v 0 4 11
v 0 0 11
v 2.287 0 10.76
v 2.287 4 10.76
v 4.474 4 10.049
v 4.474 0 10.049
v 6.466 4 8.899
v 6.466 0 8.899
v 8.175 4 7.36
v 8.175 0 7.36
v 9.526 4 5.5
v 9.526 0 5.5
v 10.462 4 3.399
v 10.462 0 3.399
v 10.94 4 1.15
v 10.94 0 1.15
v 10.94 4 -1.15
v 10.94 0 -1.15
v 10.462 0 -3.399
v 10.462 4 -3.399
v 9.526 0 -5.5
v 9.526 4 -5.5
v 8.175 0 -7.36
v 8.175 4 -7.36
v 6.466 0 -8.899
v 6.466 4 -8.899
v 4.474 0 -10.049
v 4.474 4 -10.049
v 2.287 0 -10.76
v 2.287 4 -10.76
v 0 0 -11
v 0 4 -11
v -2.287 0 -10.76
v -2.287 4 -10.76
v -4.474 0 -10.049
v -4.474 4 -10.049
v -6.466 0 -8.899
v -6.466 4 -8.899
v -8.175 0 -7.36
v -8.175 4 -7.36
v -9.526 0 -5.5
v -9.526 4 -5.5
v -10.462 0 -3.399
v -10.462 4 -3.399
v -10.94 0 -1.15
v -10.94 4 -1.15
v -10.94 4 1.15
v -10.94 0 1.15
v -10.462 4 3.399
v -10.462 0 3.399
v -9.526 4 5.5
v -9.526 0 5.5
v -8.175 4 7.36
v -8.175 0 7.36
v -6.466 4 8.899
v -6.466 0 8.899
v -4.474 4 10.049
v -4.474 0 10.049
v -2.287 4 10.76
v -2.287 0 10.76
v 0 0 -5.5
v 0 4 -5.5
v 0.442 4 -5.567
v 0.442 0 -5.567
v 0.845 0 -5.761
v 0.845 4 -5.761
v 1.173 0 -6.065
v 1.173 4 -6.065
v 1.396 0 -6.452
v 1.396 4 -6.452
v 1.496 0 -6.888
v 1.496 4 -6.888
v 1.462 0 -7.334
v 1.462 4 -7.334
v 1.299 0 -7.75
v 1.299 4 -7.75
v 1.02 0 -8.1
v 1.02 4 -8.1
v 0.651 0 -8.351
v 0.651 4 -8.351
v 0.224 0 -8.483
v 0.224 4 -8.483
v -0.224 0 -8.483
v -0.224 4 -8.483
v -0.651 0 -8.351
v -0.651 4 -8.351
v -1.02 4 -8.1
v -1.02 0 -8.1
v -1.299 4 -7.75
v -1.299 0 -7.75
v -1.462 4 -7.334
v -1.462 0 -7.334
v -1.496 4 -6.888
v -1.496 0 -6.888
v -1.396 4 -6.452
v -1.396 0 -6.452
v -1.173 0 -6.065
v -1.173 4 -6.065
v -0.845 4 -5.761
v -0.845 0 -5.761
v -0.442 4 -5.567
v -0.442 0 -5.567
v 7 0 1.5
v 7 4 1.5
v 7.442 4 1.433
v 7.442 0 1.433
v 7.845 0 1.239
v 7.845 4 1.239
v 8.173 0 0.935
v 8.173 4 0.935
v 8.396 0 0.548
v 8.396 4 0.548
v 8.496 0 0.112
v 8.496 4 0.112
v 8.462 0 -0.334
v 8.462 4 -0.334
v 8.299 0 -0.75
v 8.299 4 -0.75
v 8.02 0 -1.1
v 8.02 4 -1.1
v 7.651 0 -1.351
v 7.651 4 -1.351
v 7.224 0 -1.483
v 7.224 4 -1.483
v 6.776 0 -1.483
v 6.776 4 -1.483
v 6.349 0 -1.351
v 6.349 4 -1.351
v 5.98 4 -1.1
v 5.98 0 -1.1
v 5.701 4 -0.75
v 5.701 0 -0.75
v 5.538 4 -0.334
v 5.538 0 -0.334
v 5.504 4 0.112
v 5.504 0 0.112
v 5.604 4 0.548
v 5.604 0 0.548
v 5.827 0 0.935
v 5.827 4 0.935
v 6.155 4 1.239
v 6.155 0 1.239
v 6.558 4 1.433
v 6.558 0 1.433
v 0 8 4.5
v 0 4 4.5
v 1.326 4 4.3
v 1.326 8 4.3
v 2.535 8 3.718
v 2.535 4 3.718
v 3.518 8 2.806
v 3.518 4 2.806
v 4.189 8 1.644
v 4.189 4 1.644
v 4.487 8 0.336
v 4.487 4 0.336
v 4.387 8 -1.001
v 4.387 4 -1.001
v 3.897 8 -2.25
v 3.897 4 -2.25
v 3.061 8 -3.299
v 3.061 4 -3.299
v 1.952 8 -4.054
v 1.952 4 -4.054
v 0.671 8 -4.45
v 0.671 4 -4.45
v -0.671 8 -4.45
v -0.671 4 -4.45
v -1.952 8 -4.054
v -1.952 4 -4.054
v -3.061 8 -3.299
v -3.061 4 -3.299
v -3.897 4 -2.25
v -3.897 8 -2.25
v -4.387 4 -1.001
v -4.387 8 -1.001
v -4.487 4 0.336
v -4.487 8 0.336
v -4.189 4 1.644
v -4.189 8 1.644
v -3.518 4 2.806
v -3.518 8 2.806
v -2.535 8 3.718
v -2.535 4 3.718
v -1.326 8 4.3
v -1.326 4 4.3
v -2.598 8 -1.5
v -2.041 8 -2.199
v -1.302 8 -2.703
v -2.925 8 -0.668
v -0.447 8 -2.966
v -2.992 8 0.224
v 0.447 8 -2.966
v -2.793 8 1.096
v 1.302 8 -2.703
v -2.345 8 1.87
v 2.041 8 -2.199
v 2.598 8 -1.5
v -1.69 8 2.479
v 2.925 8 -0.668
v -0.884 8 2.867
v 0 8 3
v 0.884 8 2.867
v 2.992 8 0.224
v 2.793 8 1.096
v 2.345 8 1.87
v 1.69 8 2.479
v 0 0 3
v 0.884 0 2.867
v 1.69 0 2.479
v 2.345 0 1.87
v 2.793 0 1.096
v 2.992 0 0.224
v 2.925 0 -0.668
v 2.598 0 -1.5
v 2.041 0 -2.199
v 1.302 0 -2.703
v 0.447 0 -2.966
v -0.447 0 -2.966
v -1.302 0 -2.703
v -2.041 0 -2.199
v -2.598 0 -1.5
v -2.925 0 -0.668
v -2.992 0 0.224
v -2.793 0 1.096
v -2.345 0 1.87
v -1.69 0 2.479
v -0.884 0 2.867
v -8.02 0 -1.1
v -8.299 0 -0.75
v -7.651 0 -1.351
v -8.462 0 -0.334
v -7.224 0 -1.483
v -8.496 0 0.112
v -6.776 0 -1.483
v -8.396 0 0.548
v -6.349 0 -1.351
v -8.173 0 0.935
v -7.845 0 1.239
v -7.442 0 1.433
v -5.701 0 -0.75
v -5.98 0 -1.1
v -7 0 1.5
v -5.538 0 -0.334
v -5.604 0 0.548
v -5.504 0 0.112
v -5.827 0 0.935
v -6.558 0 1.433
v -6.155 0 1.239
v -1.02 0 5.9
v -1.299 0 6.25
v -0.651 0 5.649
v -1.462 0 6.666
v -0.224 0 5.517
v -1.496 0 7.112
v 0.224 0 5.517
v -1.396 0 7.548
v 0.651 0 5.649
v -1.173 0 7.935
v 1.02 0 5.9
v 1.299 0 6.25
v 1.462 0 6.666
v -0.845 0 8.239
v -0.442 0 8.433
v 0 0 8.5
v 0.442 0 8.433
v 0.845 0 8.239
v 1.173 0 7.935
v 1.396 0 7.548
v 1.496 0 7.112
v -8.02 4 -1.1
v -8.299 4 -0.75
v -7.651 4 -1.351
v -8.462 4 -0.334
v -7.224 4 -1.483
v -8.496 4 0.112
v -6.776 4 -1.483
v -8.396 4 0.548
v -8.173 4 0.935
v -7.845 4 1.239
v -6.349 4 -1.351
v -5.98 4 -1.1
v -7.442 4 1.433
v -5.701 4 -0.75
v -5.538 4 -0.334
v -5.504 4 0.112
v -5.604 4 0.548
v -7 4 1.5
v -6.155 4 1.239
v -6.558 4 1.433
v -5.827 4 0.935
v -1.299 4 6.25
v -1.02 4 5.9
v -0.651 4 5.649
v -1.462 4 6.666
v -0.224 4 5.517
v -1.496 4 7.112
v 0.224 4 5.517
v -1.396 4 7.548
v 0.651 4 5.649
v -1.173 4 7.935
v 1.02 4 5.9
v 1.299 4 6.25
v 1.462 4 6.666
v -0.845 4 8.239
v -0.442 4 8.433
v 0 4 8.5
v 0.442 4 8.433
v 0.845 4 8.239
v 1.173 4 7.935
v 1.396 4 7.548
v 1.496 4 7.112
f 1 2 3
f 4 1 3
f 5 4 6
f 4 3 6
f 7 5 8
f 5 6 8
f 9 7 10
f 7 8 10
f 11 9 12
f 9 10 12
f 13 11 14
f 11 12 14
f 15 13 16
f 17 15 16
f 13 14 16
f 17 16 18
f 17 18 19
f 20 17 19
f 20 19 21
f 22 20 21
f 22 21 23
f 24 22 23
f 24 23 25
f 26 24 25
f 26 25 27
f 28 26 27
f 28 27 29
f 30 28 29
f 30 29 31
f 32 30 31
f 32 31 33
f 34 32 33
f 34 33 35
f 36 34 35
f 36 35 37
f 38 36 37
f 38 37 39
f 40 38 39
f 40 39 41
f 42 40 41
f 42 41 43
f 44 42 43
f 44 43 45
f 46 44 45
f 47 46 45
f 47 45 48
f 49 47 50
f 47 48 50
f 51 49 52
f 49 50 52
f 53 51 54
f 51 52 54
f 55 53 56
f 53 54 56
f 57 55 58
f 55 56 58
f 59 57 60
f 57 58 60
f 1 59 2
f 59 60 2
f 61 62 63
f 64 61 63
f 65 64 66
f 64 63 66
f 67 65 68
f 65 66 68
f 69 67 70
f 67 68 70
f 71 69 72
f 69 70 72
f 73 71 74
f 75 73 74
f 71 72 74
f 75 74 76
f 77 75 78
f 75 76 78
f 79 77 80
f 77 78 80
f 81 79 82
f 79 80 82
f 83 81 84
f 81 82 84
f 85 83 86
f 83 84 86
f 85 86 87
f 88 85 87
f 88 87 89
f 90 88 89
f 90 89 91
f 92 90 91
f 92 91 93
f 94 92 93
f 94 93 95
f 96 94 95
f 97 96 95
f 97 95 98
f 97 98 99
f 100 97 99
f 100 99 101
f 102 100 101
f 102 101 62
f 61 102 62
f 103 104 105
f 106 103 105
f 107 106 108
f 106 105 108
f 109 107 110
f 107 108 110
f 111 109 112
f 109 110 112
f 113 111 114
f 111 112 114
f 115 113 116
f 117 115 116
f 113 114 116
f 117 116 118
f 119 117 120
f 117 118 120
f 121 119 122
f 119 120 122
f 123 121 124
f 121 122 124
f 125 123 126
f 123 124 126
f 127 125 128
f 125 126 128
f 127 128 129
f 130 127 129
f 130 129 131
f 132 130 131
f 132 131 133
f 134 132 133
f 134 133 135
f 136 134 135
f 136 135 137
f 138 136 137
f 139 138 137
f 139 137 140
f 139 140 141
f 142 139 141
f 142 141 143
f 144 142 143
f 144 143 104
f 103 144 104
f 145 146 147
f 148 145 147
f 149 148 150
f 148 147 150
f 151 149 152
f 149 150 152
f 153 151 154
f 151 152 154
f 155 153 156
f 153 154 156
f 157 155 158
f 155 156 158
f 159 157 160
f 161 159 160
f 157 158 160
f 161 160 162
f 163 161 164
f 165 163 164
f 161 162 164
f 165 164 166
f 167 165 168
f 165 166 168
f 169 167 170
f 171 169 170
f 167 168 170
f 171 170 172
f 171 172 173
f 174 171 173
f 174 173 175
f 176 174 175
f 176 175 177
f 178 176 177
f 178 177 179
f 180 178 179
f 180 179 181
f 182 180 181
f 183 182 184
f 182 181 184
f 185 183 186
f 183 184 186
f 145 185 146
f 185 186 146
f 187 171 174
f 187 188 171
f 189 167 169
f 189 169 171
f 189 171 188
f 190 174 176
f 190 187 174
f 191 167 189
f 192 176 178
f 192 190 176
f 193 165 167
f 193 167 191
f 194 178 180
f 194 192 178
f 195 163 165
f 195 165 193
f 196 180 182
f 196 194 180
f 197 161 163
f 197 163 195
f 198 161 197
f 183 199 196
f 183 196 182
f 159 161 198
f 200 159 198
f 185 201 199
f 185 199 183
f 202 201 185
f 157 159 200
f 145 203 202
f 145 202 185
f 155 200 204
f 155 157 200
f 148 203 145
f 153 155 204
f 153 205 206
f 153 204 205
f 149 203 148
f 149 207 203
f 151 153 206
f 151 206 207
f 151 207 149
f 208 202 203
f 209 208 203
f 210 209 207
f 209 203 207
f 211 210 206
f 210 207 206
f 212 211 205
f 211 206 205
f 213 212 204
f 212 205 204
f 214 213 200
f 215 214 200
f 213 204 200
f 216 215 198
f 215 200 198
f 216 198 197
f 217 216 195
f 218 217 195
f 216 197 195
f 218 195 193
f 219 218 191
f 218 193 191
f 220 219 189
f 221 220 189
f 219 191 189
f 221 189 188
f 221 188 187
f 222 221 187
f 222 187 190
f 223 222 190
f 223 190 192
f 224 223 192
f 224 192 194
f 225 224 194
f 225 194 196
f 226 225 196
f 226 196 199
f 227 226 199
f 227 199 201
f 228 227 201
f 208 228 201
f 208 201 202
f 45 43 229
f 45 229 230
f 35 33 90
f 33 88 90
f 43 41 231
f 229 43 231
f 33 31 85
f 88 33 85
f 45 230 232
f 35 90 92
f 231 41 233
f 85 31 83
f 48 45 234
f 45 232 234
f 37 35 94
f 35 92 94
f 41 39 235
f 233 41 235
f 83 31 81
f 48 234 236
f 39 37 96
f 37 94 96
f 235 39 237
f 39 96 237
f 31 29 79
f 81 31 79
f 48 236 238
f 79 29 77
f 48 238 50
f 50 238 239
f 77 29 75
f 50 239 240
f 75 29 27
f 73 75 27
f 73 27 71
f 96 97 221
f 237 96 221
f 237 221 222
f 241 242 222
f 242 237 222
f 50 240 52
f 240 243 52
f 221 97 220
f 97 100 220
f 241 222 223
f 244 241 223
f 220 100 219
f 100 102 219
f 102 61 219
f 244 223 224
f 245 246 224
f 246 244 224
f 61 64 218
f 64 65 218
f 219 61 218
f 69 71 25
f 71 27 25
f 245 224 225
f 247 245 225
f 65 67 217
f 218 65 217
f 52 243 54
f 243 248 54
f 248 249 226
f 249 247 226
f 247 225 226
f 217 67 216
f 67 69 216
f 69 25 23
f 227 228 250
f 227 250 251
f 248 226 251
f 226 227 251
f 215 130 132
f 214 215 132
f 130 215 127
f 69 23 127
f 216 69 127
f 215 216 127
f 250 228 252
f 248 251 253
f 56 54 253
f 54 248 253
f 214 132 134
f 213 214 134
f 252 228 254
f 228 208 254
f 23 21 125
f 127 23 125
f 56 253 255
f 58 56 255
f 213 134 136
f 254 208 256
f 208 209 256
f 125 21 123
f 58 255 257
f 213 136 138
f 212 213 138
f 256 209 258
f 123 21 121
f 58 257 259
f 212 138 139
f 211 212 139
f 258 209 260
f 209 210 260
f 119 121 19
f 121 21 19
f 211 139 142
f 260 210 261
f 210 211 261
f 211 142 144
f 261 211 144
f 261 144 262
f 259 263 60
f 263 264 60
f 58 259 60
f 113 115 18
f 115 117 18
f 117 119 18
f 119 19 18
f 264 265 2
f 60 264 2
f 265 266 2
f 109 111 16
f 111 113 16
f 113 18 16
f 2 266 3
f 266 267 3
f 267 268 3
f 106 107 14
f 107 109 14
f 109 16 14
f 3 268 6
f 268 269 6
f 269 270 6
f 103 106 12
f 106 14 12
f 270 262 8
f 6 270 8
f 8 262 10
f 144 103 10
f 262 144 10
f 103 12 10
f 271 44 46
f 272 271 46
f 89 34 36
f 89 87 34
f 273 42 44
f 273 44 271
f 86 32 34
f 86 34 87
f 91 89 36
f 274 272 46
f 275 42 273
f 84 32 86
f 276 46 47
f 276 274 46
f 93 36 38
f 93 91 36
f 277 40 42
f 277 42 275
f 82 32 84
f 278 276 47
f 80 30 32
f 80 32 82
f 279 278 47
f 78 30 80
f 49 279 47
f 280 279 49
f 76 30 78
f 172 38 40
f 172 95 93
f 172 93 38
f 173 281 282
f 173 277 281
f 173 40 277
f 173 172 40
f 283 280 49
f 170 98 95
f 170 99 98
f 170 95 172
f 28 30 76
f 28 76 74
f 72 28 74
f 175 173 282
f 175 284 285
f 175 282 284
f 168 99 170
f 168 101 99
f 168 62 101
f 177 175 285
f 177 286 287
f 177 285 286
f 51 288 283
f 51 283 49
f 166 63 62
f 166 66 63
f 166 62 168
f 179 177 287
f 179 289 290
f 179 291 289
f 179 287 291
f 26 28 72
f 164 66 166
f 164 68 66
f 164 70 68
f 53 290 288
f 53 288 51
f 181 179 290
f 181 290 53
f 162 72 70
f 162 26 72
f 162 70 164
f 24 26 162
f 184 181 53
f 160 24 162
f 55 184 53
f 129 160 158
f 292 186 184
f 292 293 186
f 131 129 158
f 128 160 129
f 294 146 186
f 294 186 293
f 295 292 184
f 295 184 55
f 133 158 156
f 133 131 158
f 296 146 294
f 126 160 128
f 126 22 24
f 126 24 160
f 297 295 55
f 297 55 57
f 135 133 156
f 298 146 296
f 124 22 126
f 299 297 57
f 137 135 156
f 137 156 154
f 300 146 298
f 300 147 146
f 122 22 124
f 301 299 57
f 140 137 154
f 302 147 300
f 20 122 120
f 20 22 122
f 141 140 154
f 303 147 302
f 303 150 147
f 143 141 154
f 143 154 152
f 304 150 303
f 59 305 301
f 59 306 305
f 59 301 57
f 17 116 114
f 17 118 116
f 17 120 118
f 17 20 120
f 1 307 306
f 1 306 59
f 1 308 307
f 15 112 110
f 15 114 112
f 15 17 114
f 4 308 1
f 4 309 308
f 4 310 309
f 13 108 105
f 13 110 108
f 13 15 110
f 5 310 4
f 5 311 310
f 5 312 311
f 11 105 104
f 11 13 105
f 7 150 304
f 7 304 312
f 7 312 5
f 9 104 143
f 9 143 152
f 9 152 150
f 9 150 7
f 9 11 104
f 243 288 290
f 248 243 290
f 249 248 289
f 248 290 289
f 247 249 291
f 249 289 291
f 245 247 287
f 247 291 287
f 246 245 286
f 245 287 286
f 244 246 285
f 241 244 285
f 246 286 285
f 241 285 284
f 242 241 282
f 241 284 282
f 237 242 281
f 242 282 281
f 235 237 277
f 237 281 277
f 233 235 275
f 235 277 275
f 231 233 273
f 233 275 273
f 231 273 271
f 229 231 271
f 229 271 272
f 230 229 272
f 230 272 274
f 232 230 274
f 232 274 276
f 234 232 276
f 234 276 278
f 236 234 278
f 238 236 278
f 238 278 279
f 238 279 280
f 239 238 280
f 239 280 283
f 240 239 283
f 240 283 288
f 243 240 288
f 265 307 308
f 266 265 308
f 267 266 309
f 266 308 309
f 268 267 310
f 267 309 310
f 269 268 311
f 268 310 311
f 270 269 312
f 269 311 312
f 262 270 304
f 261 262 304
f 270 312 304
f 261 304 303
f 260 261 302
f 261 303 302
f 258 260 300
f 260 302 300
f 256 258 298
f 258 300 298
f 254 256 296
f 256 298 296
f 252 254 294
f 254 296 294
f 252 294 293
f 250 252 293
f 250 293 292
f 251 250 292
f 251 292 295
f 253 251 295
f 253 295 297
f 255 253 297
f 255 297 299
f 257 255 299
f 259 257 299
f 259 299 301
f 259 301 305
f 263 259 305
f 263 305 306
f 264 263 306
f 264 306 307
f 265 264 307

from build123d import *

# Parameters (mm, degrees)
SKETCH1_R           = 11
BOSS_EXTRUDE2_DEPTH = 8
SKETCH3_R           = 3
SKETCH3_R_2         = 1.5
CUT_EXTRUDE2_DEPTH  = 12
CUT_EXTRUDE3_START  = -4
SKETCH4_R           = 11
SKETCH4_R_2         = 4.5
CUT_EXTRUDE3_DEPTH  = 4


with BuildPart() as part:
    # Sketch1 → Boss-Extrude2 (new body)
    with BuildSketch(Plane(origin=(0, 0, 0), x_dir=(1, 0, 0), z_dir=(0, 1, 0))):
        with Locations(Location((0, 0, 0), (0, 0, 270))):
            Circle(SKETCH1_R)
    extrude(amount=BOSS_EXTRUDE2_DEPTH)

    # Sketch3 → Cut-Extrude2 (cut)
    with BuildSketch(Plane(origin=(0, 8, 0), x_dir=(1, 0, 0), z_dir=(0, 1, 0))):
        with Locations(Location((0, 0, 0), (0, 0, 270))):
            Circle(SKETCH3_R)
        with Locations(Location((-7, 0, 0), (0, 0, 270))):
            Circle(SKETCH3_R_2)
        with Locations(Location((0, 7, 0), (0, 0, 270))):
            Circle(SKETCH3_R_2)
        with Locations(Location((7, 0, 0), (0, 0, 270))):
            Circle(SKETCH3_R_2)
        with Locations(Location((0, -7, 0), (0, 0, 270))):
            Circle(SKETCH3_R_2)
    extrude(amount=-CUT_EXTRUDE2_DEPTH, mode=Mode.SUBTRACT)

    # Sketch4 → Cut-Extrude3 (cut)
    with BuildSketch(Plane(origin=(0, 8, 0), x_dir=(1, 0, 0), z_dir=(0, 1, 0)).offset(CUT_EXTRUDE3_START)):
        with Locations(Location((0, 0, 0), (0, 0, 270))):
            Circle(SKETCH4_R)
        with Locations(Location((0, 0, 0), (0, 0, 270))):
            Circle(SKETCH4_R_2, mode=Mode.SUBTRACT)
    extrude(amount=CUT_EXTRUDE3_DEPTH, mode=Mode.SUBTRACT)


solid = part.part
